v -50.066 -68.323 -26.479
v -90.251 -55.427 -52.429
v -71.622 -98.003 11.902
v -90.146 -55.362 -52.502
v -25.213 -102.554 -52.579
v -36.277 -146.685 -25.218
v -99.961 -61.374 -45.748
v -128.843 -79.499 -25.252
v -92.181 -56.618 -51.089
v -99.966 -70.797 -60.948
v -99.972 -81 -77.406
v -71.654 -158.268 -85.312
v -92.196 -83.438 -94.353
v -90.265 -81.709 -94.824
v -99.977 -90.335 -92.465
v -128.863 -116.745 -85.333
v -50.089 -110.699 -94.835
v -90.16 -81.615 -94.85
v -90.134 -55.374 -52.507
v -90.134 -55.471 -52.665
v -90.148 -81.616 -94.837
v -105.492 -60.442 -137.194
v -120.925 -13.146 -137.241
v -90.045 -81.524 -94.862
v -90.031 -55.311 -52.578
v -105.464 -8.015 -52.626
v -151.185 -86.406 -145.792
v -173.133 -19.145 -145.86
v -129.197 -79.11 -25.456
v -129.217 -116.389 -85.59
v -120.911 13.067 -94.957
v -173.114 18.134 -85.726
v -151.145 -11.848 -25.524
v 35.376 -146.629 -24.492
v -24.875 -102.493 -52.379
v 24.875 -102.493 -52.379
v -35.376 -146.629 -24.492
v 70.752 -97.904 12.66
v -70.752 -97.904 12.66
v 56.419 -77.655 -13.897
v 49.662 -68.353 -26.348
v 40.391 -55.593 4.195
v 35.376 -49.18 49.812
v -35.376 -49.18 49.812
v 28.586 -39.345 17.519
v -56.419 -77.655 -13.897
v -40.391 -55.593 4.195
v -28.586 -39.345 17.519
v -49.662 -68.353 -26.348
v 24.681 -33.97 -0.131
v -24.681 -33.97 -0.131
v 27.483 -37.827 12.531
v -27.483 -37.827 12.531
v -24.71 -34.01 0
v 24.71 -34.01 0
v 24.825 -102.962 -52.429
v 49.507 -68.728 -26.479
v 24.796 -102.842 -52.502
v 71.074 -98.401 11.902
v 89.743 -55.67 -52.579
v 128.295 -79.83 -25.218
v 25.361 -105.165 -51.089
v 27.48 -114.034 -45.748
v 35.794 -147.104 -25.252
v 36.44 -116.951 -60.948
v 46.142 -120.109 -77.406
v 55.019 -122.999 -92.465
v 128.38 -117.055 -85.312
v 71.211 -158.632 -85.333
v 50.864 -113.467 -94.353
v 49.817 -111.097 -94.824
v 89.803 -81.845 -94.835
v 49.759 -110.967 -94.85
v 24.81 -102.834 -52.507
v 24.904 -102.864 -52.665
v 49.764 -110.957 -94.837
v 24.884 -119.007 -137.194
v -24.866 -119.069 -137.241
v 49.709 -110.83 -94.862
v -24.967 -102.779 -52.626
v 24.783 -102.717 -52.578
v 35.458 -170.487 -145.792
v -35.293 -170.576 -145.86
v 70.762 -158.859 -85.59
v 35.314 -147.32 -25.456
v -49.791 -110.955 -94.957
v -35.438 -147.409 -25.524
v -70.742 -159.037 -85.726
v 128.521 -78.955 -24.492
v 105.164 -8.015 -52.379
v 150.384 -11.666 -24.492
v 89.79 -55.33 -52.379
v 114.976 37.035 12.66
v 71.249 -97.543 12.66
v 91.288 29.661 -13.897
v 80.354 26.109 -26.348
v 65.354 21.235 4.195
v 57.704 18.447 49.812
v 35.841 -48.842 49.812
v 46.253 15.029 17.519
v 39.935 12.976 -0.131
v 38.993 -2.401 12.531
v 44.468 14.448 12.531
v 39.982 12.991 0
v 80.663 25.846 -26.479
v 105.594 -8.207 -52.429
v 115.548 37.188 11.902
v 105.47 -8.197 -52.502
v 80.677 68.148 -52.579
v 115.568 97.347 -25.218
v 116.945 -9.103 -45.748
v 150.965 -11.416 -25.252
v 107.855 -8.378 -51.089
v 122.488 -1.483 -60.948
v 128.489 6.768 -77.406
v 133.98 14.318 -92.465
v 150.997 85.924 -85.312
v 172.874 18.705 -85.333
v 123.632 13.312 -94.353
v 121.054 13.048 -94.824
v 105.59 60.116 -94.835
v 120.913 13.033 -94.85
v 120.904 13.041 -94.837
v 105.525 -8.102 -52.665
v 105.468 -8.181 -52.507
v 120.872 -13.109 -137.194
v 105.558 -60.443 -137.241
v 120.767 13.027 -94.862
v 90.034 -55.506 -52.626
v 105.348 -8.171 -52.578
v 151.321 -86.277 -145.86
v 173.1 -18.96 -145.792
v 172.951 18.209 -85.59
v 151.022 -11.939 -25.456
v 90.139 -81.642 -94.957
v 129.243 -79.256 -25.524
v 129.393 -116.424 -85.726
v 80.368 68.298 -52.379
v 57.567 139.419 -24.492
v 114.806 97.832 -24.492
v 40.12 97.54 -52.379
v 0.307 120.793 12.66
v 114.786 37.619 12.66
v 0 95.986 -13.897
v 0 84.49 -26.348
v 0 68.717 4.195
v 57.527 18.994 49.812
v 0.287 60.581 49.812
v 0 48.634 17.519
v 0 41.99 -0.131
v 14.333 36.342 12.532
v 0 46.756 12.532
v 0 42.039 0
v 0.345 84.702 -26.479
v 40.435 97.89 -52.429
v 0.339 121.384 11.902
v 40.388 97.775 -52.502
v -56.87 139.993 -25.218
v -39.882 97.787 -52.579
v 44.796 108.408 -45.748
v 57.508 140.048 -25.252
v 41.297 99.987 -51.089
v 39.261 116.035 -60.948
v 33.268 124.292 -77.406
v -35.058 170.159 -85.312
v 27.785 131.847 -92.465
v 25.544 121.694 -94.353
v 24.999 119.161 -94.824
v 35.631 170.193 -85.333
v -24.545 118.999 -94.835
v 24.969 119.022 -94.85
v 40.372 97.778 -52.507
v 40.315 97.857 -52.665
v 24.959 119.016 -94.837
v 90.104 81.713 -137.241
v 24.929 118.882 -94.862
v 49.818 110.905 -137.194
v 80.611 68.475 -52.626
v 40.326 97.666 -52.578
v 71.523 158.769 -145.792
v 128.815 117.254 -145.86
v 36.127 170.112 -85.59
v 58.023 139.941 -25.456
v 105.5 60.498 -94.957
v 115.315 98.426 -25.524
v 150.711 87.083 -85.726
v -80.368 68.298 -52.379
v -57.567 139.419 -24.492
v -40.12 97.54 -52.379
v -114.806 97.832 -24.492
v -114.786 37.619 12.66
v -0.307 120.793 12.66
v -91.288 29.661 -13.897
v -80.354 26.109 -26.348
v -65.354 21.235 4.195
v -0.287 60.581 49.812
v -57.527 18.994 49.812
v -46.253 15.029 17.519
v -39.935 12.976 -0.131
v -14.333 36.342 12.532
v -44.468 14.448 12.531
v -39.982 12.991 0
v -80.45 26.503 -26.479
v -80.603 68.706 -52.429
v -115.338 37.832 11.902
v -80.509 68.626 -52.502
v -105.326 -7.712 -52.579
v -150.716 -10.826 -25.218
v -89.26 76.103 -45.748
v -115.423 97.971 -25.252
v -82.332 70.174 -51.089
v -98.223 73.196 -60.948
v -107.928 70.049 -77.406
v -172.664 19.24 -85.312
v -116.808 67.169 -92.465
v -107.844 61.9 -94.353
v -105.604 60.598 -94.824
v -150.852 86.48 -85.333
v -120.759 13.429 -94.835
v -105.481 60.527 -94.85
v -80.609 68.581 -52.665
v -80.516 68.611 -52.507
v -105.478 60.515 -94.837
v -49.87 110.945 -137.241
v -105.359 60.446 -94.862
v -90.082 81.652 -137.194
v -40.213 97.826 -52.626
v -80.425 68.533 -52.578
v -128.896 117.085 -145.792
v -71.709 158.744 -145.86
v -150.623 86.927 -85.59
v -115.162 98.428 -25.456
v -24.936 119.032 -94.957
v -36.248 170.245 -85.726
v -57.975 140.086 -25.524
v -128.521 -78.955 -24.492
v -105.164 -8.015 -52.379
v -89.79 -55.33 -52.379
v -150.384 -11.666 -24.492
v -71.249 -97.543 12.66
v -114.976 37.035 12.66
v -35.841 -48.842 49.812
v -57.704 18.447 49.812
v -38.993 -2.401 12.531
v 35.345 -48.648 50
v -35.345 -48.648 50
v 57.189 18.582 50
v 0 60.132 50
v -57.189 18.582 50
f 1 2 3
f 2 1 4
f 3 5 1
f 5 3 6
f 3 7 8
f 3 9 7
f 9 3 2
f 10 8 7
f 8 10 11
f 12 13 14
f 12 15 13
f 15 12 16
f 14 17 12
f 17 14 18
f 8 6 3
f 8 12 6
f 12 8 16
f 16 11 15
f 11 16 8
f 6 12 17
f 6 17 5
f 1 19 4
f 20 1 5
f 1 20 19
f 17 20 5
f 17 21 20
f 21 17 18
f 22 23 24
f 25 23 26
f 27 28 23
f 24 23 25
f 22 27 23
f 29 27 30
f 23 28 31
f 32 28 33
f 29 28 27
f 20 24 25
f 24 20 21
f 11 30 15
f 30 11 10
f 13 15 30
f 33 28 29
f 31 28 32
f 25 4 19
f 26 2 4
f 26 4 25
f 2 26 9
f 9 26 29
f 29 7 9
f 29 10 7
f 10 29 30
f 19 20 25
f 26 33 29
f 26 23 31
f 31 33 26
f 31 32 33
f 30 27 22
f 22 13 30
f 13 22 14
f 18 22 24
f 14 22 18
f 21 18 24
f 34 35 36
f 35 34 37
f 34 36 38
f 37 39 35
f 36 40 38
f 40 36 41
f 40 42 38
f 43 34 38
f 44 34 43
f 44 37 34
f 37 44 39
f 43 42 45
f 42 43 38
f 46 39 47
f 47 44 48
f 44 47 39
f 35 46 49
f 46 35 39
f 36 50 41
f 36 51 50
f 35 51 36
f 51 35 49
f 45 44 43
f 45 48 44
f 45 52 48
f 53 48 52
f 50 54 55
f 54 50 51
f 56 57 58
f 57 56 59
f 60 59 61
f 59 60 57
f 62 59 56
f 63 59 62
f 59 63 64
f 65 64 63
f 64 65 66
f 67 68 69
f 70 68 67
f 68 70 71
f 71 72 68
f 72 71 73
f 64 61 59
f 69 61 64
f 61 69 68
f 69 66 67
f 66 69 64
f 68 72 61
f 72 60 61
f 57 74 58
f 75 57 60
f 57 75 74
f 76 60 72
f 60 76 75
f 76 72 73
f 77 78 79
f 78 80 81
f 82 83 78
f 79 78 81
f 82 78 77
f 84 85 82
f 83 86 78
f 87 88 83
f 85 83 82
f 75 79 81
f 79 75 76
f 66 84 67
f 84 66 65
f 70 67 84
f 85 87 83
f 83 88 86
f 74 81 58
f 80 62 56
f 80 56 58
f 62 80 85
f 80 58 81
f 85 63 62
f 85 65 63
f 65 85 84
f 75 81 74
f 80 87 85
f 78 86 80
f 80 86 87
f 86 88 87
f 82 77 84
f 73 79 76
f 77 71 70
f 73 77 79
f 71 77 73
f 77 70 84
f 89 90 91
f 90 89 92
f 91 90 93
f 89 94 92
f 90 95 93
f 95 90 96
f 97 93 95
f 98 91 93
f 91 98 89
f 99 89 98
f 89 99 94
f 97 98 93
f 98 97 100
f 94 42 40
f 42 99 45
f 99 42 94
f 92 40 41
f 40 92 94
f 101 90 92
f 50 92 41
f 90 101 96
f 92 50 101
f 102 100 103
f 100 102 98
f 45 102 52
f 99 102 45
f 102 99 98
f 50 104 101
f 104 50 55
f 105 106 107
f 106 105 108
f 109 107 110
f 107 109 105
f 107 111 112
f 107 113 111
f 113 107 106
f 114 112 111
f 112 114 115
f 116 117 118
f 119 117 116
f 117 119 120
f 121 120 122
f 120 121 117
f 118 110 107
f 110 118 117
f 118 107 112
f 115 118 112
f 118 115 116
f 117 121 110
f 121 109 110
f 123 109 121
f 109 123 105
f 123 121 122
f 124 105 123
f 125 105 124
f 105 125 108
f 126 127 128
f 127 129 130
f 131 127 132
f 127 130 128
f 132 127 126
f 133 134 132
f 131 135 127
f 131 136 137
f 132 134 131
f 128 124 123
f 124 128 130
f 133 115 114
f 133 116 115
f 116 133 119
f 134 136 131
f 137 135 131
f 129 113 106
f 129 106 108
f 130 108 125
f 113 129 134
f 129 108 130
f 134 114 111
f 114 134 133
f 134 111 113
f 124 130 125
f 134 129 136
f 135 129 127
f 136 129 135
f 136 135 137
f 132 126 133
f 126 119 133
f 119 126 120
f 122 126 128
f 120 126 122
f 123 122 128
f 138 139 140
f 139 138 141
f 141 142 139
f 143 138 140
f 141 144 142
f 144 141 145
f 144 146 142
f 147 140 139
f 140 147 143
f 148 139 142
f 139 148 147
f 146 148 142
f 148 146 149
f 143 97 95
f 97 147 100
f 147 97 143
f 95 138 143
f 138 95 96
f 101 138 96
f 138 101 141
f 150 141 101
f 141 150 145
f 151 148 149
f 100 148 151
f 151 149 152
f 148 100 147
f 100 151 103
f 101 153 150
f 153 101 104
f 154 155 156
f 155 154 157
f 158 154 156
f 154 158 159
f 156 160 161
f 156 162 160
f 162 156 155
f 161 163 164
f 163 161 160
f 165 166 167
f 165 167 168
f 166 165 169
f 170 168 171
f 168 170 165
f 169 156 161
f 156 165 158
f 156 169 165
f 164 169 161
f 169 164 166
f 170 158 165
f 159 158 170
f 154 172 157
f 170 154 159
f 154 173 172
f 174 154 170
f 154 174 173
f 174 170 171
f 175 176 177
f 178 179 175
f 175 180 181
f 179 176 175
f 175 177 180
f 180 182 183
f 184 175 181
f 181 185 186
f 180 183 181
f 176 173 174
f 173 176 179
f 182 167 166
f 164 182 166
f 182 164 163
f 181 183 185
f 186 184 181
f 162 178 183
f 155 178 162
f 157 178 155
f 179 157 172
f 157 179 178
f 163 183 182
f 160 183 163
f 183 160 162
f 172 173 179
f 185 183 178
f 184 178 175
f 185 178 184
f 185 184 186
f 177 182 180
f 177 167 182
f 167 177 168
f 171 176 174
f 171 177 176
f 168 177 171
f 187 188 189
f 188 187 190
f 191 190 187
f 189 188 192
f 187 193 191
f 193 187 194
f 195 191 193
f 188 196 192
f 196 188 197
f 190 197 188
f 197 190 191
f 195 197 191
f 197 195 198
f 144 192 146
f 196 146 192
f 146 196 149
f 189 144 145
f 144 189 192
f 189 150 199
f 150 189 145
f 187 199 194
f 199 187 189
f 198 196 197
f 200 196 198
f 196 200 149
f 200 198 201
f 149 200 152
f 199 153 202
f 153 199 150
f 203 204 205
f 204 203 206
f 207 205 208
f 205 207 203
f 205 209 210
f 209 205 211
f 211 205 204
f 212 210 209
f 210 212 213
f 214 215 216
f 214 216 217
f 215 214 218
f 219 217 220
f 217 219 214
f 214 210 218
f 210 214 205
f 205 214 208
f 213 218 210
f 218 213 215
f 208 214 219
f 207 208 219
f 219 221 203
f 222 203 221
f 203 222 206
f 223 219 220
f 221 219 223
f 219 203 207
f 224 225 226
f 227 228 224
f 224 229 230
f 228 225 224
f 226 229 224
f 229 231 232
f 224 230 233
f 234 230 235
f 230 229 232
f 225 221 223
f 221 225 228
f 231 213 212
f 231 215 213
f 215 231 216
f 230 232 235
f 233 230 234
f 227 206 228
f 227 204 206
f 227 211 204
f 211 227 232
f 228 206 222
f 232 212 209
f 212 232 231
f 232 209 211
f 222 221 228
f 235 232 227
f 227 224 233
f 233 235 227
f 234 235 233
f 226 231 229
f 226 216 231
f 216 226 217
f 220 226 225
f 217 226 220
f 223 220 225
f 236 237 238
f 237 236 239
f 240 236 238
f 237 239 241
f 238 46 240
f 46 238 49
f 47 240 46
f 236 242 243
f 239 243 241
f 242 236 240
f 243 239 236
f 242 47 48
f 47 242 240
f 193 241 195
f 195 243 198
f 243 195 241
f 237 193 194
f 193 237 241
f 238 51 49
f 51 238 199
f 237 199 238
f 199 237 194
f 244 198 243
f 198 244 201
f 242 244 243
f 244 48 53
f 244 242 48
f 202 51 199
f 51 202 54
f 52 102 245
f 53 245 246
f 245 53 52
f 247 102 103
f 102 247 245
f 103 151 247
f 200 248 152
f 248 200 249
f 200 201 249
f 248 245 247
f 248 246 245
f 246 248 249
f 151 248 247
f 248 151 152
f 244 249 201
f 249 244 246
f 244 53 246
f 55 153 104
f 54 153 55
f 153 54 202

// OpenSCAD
height = 50; 
spacing = 0.5;

// create a pentagon by length.
// Parameters:
//     length : the side length
//     spacing : the gap between a pentagon or a hexagon
module pentagon(length, spacing = 0.5) {
    r = 0.5 * length / sin(36);
	s = (r - spacing / 2) / r;

    color("black") 
	    rotate(18) 		     
		     linear_extrude(length, scale = 1.42215)
		        scale([s, s, s])
			        circle(0.5 * length / sin(36), $fn = 5);
}

// create a hexagon by length.
// Parameters:
//     length : the side length
//     spacing : the gap between a pentagon or a hexagon
module hexagon(length, spacing = 0.5) {
    r = 0.5 * length / sin(30);
	s = (r - spacing / 2) / r;

    color("white") 
	     linear_extrude(length - length * 0.02125, scale = 1.42215) 
		    scale([s, s, s])			
		        circle(0.5 * length / sin(30), $fn = 6);
}

// a placeholder pentagon, one pentagon and two hexagons.
// Parameters:
//     length : the side length
//     spacing : the gap between the pentagon and hexagon
module pentagon_based_sub_comp(length, spacing = 0.5) {
	pentagon_circle_r = 0.5 * length / sin(36);
	
	a = 37.325;
	
	offset_y = 0.5 * length * tan(54) + pentagon_circle_r * cos(a);
	offset_z = 0.5 * length * tan(60) * sin(a);
	
	translate([0, -offset_y, -offset_z]) 
	    rotate([a, 0, 0]) 
		    hexagon_based_sub_comp(length, spacing);
}


// two hexagons and one pentagon.
// Parameters:
//     length : the side length
//     spacing : the gap between the pentagon and hexagon
module hexagon_based_sub_comp(length, spacing = 0.5) {
    hexagon(length, spacing);
	
	length_center_to_side = 0.5 * length * tan(54);
	
    a = -37.325;
	
	offset_y = 0.5 * length * (tan(54) * cos(a) + tan(60));
	offset_z = length_center_to_side * sin(a);
	
	rotate(120) translate([0, offset_y, offset_z]) 
	    rotate([a, 0, 0]) 
	        pentagon_hexagon(length, spacing);
			
}

// a pentagon and a hexagon.
// Parameters:
//     length : the side length
//     spacing : the gap between the pentagon and hexagon
module pentagon_hexagon(length, spacing = 0.5) {
	pentagon_circle_r = 0.5 * length / sin(36);
	
	pentagon(length, spacing);
	
	a = 37.325;
	
	offset_y = 0.5 * length * tan(54) + pentagon_circle_r * cos(a);
	offset_z = 0.5 * length * tan(60) * sin(a);
	
	rotate(144) translate([0, -offset_y, -offset_z]) 
	    rotate([a, 0, 0]) 
		    hexagon(length, spacing);
}

// a half of soccer polyhedron.
// Parameters:
//     line_length : the side length of pentagons and hexagons
//     spacing : the gap between the pentagon and hexagon
module half_soccer_polyhedron(line_length, spacing = 0.5) {
	pentagon_circle_r = 0.5 * line_length / sin(36);
	offset_y = pentagon_circle_r * cos(36);

	pentagon(line_length, spacing);
	
	for(i = [0:4]) {
		rotate(72 * i) 
		    pentagon_based_sub_comp(line_length, spacing);
	}
}

// a soccer polyhedron.
// Parameters:
//     line_length : the side length of pentagons and hexagons
//     spacing : the gap between the pentagon and hexagon
//     center : center it or not
module soccer_polyhedron(height, spacing = 0.5, center = true) {
    line_length = height / 6.65;
	
	offset_for_center = center ? height / 2: 0;
	
	translate([0, 0, -offset_for_center]) union() {
		translate([0, 0, -line_length + line_length * 6.64875]) 
		    half_soccer_polyhedron(line_length, spacing);
			
		rotate(36) mirror([0, 0, 1]) translate([0, 0, -line_length]) 
		    half_soccer_polyhedron(line_length, spacing);
	}
}

half_soccer_polyhedron(height, spacing); 
